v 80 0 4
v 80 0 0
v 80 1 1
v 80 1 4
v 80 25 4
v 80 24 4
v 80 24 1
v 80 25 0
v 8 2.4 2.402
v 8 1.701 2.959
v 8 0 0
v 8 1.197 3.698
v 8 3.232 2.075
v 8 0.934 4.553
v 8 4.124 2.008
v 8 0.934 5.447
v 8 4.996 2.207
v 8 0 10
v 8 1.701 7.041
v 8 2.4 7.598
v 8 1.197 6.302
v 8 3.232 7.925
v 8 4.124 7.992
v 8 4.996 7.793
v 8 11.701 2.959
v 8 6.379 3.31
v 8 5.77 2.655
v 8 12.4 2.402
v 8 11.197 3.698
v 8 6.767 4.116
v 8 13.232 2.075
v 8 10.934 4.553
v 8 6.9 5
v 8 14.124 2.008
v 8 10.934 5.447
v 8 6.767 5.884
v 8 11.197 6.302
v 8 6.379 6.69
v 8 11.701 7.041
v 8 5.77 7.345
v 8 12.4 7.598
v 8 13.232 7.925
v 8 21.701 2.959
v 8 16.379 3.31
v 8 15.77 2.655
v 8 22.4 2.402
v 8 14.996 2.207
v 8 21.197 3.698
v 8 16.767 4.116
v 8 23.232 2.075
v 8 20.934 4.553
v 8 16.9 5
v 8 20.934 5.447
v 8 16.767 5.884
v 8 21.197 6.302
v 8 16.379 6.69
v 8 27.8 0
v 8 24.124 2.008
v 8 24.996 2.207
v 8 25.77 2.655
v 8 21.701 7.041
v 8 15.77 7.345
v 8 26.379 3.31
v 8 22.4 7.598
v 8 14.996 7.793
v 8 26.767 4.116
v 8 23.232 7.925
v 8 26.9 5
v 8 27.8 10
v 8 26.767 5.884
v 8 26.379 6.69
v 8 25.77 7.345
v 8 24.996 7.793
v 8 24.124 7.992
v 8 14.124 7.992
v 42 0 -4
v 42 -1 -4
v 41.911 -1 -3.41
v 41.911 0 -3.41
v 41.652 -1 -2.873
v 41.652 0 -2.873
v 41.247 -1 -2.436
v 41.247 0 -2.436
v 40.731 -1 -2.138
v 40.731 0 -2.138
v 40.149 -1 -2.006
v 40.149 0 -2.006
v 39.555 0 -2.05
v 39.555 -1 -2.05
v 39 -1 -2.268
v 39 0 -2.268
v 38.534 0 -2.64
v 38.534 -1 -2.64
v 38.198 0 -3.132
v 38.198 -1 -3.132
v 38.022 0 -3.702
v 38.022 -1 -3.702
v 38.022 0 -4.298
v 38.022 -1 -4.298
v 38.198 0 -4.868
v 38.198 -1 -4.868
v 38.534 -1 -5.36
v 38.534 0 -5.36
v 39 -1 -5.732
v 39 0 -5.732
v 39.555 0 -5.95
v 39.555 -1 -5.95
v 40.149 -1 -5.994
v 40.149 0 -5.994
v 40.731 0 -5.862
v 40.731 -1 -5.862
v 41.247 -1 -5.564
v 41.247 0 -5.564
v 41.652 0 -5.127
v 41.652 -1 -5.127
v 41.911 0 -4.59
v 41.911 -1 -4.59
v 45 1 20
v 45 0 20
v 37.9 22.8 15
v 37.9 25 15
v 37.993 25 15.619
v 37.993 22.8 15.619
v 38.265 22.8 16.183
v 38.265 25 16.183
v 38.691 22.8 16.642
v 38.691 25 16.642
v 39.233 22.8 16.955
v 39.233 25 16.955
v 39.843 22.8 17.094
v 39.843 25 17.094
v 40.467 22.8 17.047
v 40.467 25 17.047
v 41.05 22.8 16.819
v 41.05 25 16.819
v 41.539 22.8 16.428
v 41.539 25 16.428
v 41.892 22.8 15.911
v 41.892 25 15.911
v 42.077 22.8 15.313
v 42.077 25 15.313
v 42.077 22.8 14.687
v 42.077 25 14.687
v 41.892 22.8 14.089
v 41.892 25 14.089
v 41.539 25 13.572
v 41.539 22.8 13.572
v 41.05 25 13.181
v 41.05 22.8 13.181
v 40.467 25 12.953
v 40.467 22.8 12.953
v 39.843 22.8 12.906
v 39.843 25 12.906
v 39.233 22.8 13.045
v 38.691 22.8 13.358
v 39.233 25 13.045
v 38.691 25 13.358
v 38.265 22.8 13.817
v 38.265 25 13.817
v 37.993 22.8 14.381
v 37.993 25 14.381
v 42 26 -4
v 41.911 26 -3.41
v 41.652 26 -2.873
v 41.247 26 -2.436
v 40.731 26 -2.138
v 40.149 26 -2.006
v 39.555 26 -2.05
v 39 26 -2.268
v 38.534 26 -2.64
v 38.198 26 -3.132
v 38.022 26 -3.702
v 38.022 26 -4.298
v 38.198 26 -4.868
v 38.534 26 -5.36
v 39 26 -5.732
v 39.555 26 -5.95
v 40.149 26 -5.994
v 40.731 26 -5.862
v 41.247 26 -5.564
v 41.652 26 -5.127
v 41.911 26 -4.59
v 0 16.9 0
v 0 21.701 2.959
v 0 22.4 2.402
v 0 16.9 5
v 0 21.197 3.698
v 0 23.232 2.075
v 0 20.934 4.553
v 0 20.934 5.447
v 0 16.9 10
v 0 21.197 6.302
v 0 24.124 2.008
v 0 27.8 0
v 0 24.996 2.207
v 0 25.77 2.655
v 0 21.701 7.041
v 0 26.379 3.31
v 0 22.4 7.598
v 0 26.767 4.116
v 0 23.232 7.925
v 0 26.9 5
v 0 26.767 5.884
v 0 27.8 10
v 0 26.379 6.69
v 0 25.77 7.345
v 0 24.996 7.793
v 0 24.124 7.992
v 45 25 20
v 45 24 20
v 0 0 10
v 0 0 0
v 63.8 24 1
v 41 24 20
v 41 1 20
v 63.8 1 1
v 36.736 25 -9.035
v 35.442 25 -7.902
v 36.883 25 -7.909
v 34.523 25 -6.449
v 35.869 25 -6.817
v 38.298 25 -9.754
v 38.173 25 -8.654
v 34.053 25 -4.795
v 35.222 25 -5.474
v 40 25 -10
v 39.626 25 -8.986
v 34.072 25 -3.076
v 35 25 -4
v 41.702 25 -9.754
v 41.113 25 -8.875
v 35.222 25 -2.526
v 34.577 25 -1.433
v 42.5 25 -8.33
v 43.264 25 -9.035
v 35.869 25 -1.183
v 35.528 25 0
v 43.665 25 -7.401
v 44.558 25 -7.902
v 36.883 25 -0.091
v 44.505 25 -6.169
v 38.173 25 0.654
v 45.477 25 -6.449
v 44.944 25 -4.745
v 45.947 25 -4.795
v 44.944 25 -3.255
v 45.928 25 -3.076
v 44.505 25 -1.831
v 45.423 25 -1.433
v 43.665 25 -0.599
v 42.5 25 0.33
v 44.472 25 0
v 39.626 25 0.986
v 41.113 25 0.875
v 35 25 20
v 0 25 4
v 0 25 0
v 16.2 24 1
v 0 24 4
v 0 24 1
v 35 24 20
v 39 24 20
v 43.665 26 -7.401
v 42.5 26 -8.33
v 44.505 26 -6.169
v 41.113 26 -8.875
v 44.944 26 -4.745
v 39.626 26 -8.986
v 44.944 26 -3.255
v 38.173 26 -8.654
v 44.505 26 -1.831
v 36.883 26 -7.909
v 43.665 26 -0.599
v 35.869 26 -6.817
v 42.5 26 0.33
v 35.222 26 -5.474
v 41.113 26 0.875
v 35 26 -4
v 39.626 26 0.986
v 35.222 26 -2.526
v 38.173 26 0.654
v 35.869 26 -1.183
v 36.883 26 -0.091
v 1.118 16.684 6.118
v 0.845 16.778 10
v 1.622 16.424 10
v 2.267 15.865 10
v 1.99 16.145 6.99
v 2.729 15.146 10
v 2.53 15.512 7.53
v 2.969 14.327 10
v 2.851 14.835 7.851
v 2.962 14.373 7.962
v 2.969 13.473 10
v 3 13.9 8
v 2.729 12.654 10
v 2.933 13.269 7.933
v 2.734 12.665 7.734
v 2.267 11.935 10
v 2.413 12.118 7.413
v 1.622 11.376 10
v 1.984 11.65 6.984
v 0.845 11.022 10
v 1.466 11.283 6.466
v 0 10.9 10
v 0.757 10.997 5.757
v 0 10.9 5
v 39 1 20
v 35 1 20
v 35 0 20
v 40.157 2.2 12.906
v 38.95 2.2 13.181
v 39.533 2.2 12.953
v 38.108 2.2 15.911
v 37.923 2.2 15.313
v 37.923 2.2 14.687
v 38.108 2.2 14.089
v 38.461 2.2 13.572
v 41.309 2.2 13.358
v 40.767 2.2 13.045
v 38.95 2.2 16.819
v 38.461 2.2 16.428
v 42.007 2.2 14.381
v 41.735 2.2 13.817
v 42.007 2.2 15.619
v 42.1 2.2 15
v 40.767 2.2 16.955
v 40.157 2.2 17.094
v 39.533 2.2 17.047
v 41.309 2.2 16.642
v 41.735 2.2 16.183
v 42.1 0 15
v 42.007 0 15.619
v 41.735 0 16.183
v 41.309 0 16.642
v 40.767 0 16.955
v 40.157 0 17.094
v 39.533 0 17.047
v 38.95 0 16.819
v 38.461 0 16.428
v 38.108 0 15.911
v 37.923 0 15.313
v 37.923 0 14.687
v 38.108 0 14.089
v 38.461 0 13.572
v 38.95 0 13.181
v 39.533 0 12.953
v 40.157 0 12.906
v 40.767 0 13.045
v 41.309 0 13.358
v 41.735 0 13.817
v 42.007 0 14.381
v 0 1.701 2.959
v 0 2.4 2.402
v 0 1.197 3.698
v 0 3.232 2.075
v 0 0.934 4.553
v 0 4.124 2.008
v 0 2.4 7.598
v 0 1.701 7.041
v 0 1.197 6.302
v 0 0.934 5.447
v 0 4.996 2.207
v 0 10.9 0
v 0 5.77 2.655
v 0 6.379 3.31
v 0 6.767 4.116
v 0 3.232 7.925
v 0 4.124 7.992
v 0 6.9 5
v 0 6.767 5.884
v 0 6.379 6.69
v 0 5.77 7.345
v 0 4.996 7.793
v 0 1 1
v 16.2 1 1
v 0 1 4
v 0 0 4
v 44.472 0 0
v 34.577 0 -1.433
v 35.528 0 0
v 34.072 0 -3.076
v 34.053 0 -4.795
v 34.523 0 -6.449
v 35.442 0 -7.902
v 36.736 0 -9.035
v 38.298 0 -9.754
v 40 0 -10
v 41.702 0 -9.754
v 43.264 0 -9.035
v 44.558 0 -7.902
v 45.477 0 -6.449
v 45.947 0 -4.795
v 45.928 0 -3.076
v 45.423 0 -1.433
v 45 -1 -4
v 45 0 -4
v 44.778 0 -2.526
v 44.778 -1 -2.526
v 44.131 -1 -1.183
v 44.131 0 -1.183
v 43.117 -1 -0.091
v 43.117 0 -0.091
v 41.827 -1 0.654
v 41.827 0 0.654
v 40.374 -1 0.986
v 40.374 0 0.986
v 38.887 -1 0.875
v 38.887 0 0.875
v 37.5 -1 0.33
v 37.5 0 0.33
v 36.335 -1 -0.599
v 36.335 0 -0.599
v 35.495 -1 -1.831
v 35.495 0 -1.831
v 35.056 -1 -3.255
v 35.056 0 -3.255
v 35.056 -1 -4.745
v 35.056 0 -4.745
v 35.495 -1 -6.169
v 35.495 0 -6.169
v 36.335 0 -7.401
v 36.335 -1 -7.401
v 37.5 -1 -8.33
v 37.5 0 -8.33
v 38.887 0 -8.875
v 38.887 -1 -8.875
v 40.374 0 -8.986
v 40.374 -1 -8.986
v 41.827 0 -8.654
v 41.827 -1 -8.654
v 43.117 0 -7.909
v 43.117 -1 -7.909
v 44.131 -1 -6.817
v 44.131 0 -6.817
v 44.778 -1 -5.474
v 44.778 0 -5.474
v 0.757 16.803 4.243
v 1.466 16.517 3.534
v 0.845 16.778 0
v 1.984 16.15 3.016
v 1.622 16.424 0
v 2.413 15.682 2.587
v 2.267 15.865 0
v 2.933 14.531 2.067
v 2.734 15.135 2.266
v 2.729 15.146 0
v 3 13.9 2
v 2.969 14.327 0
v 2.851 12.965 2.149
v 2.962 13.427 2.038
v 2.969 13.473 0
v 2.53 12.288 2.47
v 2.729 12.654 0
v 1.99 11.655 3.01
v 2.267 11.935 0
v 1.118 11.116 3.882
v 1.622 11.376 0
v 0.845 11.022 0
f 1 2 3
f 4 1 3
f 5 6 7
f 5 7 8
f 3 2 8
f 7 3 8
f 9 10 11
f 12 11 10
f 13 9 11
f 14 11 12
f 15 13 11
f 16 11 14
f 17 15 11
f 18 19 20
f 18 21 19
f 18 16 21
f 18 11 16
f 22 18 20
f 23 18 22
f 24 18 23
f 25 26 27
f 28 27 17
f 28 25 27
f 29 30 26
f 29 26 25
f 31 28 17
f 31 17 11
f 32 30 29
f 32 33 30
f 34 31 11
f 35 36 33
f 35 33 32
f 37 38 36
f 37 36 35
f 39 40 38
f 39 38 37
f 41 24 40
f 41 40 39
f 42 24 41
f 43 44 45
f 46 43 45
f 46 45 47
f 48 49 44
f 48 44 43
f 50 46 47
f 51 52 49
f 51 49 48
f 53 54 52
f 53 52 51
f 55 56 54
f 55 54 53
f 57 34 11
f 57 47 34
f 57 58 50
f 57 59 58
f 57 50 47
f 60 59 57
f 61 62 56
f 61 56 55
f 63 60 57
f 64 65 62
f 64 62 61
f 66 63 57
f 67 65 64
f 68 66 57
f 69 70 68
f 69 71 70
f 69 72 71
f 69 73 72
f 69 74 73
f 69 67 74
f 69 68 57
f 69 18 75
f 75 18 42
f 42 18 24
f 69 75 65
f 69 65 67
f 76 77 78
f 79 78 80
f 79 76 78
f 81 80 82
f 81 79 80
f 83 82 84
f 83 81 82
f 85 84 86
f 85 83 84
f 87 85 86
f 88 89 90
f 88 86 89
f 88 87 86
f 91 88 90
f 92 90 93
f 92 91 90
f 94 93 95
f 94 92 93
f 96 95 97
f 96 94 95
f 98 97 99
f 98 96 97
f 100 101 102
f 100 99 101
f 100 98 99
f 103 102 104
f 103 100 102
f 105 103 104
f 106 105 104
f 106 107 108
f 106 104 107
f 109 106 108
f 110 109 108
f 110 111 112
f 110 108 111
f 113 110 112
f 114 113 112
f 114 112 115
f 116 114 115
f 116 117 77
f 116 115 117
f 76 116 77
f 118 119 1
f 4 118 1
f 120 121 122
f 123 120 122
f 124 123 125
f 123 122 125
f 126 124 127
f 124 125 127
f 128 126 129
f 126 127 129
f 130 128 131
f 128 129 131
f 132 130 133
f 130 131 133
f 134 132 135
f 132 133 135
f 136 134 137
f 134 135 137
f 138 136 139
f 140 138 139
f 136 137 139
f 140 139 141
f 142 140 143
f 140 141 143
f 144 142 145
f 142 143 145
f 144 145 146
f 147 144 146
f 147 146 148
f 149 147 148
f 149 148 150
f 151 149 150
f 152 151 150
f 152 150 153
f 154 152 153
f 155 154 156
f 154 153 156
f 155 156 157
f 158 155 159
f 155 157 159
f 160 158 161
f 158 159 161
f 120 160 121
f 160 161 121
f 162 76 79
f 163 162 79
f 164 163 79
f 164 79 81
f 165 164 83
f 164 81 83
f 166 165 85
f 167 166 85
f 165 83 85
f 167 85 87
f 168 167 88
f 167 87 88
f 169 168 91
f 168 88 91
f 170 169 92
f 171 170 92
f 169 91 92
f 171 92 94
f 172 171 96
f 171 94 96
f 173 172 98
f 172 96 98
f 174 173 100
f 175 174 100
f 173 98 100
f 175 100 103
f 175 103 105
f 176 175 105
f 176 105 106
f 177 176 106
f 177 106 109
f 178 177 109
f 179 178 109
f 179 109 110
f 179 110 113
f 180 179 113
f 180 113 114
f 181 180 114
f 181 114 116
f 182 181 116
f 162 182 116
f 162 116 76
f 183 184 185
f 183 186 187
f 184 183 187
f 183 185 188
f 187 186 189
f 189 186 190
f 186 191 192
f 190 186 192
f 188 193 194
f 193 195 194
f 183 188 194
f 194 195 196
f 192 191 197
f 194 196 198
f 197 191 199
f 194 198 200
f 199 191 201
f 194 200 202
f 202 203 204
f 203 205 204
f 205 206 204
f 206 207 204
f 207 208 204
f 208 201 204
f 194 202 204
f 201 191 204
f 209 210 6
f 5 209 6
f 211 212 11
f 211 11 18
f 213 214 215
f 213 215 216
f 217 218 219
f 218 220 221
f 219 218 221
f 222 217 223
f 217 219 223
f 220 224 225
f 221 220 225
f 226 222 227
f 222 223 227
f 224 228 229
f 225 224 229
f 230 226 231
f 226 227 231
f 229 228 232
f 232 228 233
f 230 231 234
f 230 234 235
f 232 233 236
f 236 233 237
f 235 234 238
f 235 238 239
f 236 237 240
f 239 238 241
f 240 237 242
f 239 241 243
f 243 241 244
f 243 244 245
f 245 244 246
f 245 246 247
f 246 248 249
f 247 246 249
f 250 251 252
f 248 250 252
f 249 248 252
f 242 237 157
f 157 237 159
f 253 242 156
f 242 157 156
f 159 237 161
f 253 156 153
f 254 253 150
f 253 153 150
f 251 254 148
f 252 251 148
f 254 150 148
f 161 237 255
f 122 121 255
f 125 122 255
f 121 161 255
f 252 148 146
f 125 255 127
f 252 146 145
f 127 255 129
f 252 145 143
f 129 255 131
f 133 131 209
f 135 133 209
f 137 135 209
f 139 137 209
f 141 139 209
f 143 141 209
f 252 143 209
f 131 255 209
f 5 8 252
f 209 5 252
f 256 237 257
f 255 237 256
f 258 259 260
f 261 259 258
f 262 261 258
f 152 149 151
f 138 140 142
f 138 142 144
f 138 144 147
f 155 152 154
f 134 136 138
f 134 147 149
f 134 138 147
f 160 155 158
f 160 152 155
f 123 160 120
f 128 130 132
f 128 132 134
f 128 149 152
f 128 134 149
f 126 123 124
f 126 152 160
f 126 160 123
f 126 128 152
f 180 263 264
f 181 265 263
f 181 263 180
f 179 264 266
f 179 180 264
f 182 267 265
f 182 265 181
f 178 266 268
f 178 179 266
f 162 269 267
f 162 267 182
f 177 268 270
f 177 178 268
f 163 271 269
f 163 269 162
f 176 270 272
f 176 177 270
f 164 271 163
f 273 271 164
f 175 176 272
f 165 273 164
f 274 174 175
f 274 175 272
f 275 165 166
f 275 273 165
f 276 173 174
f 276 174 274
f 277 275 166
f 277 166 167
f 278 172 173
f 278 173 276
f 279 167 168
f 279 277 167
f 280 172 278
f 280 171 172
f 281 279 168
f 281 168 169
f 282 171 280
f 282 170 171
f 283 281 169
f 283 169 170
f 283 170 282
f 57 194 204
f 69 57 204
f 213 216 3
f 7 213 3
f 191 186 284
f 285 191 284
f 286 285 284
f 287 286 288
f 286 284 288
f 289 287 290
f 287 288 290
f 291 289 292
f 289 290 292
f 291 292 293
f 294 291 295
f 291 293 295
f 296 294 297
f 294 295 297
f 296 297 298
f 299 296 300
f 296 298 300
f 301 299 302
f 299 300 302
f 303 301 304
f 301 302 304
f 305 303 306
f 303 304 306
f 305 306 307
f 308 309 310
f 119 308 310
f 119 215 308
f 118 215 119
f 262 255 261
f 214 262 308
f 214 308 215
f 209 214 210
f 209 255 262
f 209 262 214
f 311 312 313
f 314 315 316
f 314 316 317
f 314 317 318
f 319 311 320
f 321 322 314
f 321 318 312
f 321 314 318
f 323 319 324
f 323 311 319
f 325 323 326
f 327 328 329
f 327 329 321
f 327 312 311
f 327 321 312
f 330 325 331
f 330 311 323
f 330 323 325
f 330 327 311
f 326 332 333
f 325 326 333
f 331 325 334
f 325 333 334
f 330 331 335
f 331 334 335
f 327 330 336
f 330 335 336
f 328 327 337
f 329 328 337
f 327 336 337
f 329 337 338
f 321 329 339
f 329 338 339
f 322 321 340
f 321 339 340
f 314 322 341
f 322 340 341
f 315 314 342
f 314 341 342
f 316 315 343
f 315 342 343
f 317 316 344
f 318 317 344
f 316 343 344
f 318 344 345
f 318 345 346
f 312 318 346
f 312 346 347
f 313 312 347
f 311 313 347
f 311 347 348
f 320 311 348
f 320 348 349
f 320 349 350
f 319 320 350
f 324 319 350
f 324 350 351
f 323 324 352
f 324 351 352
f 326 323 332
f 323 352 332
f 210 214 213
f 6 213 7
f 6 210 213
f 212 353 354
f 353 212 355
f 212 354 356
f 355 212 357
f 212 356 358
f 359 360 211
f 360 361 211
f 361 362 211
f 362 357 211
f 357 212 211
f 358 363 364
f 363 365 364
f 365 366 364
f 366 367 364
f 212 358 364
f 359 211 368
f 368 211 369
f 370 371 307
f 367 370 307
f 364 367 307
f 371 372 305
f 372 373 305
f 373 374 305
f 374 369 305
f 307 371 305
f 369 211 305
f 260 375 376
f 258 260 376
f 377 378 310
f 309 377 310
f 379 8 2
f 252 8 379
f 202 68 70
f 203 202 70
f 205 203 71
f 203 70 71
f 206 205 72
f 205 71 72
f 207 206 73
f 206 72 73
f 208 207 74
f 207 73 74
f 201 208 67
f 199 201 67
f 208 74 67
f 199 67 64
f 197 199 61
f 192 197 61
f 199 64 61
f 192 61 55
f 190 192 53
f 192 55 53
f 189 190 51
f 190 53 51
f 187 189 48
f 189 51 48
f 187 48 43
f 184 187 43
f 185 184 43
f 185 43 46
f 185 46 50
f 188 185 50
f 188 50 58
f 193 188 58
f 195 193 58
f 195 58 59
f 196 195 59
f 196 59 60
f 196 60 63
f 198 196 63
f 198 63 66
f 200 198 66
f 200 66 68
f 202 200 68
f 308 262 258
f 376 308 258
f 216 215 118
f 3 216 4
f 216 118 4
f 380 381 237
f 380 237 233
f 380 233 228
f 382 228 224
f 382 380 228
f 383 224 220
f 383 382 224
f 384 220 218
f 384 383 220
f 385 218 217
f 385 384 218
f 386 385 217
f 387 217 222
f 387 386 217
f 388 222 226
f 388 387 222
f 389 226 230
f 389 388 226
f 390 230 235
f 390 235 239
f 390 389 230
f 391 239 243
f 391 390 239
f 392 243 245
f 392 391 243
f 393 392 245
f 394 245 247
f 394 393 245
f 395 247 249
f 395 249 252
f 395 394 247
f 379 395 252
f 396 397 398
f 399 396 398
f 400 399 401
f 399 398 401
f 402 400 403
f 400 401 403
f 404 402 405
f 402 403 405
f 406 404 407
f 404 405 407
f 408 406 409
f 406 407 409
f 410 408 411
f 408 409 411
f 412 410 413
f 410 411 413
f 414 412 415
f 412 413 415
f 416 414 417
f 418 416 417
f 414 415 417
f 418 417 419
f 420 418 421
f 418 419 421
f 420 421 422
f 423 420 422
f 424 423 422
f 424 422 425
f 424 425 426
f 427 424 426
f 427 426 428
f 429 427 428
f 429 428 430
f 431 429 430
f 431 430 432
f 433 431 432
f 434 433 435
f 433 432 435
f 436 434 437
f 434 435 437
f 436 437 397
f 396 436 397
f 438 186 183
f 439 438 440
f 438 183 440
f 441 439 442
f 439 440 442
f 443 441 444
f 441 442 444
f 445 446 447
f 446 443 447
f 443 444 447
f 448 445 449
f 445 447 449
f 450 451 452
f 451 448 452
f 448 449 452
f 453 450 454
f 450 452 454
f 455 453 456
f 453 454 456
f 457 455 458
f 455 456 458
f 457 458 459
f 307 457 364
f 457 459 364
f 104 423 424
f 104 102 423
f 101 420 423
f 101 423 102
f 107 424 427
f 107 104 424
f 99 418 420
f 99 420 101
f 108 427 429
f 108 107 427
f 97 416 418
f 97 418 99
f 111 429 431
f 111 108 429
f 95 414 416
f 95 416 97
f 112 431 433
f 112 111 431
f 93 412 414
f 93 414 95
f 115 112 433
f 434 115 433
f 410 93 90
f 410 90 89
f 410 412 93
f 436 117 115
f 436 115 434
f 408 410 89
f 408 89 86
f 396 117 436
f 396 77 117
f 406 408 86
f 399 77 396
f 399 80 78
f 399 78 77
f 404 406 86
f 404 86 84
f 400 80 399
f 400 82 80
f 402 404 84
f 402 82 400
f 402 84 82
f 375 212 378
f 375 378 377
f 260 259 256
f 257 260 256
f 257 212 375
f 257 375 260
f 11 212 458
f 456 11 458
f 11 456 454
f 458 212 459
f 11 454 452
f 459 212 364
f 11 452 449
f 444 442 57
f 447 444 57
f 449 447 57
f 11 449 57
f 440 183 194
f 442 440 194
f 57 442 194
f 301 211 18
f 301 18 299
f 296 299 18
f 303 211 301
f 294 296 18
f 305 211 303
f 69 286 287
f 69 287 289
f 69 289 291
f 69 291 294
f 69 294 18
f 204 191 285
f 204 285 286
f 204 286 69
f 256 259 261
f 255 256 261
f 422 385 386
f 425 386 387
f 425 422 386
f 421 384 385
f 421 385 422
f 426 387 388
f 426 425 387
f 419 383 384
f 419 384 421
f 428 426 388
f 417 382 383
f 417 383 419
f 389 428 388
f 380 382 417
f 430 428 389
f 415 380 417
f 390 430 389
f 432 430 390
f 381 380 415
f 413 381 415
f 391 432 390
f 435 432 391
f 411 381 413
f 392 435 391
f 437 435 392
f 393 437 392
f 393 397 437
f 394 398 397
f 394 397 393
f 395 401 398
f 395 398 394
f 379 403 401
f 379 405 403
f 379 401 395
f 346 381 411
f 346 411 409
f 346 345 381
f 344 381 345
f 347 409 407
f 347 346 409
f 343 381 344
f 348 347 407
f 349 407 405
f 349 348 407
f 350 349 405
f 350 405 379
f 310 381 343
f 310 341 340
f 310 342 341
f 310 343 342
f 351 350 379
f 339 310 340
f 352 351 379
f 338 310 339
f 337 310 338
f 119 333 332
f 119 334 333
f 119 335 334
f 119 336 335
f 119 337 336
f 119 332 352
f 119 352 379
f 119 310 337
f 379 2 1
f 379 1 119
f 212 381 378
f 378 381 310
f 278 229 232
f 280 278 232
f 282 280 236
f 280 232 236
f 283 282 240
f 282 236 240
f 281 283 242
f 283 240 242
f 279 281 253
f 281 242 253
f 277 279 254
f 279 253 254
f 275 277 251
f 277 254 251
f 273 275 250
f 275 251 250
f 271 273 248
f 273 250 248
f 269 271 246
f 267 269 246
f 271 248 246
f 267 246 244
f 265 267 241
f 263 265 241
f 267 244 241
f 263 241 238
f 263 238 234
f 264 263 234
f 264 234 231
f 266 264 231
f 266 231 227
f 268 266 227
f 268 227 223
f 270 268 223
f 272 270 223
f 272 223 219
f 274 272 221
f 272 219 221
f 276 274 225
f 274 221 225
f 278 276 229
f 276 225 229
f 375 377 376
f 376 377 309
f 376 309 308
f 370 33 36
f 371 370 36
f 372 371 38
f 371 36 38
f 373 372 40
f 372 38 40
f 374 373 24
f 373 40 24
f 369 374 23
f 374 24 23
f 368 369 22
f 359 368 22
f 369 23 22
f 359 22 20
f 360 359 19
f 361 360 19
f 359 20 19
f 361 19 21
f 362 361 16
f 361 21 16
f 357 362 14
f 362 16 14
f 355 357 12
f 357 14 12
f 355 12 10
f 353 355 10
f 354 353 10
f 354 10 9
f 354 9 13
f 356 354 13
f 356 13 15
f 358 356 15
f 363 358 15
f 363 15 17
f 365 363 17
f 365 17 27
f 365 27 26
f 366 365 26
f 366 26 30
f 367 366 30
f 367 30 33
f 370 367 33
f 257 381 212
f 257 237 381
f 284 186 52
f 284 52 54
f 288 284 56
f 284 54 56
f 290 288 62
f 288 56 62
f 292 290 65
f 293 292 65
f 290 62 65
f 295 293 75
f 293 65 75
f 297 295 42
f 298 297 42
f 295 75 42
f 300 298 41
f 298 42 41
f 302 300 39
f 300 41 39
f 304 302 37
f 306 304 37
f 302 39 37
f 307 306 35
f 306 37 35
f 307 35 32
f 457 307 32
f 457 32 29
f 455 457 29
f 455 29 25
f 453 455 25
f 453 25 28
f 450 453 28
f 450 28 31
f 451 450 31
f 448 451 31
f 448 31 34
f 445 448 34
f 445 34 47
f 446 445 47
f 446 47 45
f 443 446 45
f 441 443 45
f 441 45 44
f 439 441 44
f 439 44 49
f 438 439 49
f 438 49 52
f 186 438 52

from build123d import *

# Parameters (mm, degrees)
SKETCH_W             = 80
SKETCH_H             = 25
PAD_DEPTH            = 20
SKETCH001_W          = 39
SKETCH001_H          = 23
POCKET_DEPTH         = 19
POCKET001_DEPTH      = 25.001
PAD006_DEPTH         = 23
PAD007_DEPTH         = 23
SKETCH003_R          = 3
PAD001_DEPTH         = 25
SKETCH004_R          = 2.1
POCKET002_DEPTH      = 2.2
SKETCH007_R          = 2.1
POCKET004_DEPTH      = 2.2
SKETCH005_R          = 6
PAD002_DEPTH         = 25
SKETCH006_R          = 5
PAD003_DEPTH         = 1
SKETCH009_R          = 5
PAD004_DEPTH         = 1
SKETCH008_R          = 2
POCKET005_DEPTH      = 26.001
POCKET005_DEPTH_BACK = -1.001
SKETCH010_W          = 27.8
SKETCH010_H          = 10
PAD005_DEPTH         = 8
SKETCH011_R          = 3
POCKET006_DEPTH      = 8.001
SKETCH012_R          = 3
HOLE_DEPTH           = 10.001


with BuildPart() as flipflop:
    # Sketch → Pad (new body)
    with BuildSketch(Plane.XY):
        with Locations((40, 12.5)):
            Rectangle(SKETCH_W, SKETCH_H)
    extrude(amount=PAD_DEPTH)

    # Sketch001 (on Face6 of Pad) → Pocket (cut)
    with BuildSketch(Plane.XY.offset(20)):
        with Locations((19.5, 12.5)):
            Rectangle(SKETCH001_W, SKETCH001_H)
        with Locations((60.5, 12.5)):
            Rectangle(SKETCH001_W, SKETCH001_H)
    extrude(amount=-POCKET_DEPTH, mode=Mode.SUBTRACT)

    # Sketch002 → Pocket001 (cut, through all)
    with BuildSketch(Plane.XZ):
        Polygon((0, 4), (35, 20), (0, 20), align=None)
        Polygon((80, 4), (80, 20), (45, 20), align=None)
    extrude(amount=-POCKET001_DEPTH, mode=Mode.SUBTRACT)

    # Sketch013 (on DatumPlane) → Pad006 (join)
    with BuildSketch(Plane.XZ.offset(-24)):
        Polygon((15, 0), (39, 0), (39, 20), align=None)
    extrude(amount=PAD006_DEPTH)

    # Sketch014 (on DatumPlane) → Pad007 (join)
    with BuildSketch(Plane.XZ.offset(-24)):
        Polygon((41, 0), (41, 20), (65, 0), align=None)
    extrude(amount=PAD007_DEPTH)

    # Sketch003 → Pad001 (join)
    with BuildSketch(Plane.XZ):
        with Locations((40, 15)):
            Circle(SKETCH003_R)
    extrude(amount=-PAD001_DEPTH)

    # Sketch004 → Pocket002 (cut)
    with BuildSketch(Plane.XZ):
        with Locations((40, 15)):
            Circle(SKETCH004_R)
    extrude(amount=-POCKET002_DEPTH, mode=Mode.SUBTRACT)

    # Sketch007 → Pocket004 (cut)
    with BuildSketch(Plane(origin=(0, 25, 0), x_dir=(-1, 0, 0), z_dir=(0, 1, 0))):
        with Locations((-40, 15)):
            Circle(SKETCH007_R)
    extrude(amount=-POCKET004_DEPTH, mode=Mode.SUBTRACT)

    # Sketch005 → Pad002 (join)
    with BuildSketch(Plane.XZ):
        with Locations((40, -4)):
            Circle(SKETCH005_R)
    extrude(amount=-PAD002_DEPTH)

    # Sketch006 → Pad003 (join)
    with BuildSketch(Plane.XZ):
        with Locations((40, -4)):
            Circle(SKETCH006_R)
    extrude(amount=PAD003_DEPTH)

    # Sketch009 (on Face1 of Pocket005) → Pad004 (join)
    with BuildSketch(Plane(origin=(0, 25, 0), x_dir=(-1, 0, 0), z_dir=(0, 1, 0))):
        with Locations((-40, -4)):
            Circle(SKETCH009_R)
    extrude(amount=PAD004_DEPTH)

    # Sketch008 → Pocket005 (cut, two sides)
    with BuildSketch(Plane.XZ) as pocket005_sk:
        with Locations((40, -4)):
            Circle(SKETCH008_R)
    extrude(amount=-POCKET005_DEPTH, mode=Mode.SUBTRACT)
    extrude(pocket005_sk.sketch, amount=-POCKET005_DEPTH_BACK, mode=Mode.SUBTRACT)


with BuildPart() as endanschlag:
    # Sketch010 → Pad005 (new body)
    with BuildSketch(Plane.YZ):
        with Locations((13.9, 5)):
            Rectangle(SKETCH010_W, SKETCH010_H)
    extrude(amount=PAD005_DEPTH)

    # Sketch011 (on DatumPlane) → Pocket006 (cut, through all)
    with BuildSketch(Plane.YZ.offset(8)):
        with Locations((3.9, 5)):
            Circle(SKETCH011_R)
        with Locations((23.9, 5)):
            Circle(SKETCH011_R)
        with Locations((13.9, 5)):
            Circle(SKETCH011_R)
    extrude(amount=-POCKET006_DEPTH, mode=Mode.SUBTRACT)

    # Sketch012 (on DatumPlane) → Hole (cut, through all)
    with BuildSketch(Plane.YX):
        with Locations((13.9, 0)):
            Circle(SKETCH012_R)
    extrude(amount=-HOLE_DEPTH, mode=Mode.SUBTRACT)


solid = Compound([flipflop.part, endanschlag.part])
